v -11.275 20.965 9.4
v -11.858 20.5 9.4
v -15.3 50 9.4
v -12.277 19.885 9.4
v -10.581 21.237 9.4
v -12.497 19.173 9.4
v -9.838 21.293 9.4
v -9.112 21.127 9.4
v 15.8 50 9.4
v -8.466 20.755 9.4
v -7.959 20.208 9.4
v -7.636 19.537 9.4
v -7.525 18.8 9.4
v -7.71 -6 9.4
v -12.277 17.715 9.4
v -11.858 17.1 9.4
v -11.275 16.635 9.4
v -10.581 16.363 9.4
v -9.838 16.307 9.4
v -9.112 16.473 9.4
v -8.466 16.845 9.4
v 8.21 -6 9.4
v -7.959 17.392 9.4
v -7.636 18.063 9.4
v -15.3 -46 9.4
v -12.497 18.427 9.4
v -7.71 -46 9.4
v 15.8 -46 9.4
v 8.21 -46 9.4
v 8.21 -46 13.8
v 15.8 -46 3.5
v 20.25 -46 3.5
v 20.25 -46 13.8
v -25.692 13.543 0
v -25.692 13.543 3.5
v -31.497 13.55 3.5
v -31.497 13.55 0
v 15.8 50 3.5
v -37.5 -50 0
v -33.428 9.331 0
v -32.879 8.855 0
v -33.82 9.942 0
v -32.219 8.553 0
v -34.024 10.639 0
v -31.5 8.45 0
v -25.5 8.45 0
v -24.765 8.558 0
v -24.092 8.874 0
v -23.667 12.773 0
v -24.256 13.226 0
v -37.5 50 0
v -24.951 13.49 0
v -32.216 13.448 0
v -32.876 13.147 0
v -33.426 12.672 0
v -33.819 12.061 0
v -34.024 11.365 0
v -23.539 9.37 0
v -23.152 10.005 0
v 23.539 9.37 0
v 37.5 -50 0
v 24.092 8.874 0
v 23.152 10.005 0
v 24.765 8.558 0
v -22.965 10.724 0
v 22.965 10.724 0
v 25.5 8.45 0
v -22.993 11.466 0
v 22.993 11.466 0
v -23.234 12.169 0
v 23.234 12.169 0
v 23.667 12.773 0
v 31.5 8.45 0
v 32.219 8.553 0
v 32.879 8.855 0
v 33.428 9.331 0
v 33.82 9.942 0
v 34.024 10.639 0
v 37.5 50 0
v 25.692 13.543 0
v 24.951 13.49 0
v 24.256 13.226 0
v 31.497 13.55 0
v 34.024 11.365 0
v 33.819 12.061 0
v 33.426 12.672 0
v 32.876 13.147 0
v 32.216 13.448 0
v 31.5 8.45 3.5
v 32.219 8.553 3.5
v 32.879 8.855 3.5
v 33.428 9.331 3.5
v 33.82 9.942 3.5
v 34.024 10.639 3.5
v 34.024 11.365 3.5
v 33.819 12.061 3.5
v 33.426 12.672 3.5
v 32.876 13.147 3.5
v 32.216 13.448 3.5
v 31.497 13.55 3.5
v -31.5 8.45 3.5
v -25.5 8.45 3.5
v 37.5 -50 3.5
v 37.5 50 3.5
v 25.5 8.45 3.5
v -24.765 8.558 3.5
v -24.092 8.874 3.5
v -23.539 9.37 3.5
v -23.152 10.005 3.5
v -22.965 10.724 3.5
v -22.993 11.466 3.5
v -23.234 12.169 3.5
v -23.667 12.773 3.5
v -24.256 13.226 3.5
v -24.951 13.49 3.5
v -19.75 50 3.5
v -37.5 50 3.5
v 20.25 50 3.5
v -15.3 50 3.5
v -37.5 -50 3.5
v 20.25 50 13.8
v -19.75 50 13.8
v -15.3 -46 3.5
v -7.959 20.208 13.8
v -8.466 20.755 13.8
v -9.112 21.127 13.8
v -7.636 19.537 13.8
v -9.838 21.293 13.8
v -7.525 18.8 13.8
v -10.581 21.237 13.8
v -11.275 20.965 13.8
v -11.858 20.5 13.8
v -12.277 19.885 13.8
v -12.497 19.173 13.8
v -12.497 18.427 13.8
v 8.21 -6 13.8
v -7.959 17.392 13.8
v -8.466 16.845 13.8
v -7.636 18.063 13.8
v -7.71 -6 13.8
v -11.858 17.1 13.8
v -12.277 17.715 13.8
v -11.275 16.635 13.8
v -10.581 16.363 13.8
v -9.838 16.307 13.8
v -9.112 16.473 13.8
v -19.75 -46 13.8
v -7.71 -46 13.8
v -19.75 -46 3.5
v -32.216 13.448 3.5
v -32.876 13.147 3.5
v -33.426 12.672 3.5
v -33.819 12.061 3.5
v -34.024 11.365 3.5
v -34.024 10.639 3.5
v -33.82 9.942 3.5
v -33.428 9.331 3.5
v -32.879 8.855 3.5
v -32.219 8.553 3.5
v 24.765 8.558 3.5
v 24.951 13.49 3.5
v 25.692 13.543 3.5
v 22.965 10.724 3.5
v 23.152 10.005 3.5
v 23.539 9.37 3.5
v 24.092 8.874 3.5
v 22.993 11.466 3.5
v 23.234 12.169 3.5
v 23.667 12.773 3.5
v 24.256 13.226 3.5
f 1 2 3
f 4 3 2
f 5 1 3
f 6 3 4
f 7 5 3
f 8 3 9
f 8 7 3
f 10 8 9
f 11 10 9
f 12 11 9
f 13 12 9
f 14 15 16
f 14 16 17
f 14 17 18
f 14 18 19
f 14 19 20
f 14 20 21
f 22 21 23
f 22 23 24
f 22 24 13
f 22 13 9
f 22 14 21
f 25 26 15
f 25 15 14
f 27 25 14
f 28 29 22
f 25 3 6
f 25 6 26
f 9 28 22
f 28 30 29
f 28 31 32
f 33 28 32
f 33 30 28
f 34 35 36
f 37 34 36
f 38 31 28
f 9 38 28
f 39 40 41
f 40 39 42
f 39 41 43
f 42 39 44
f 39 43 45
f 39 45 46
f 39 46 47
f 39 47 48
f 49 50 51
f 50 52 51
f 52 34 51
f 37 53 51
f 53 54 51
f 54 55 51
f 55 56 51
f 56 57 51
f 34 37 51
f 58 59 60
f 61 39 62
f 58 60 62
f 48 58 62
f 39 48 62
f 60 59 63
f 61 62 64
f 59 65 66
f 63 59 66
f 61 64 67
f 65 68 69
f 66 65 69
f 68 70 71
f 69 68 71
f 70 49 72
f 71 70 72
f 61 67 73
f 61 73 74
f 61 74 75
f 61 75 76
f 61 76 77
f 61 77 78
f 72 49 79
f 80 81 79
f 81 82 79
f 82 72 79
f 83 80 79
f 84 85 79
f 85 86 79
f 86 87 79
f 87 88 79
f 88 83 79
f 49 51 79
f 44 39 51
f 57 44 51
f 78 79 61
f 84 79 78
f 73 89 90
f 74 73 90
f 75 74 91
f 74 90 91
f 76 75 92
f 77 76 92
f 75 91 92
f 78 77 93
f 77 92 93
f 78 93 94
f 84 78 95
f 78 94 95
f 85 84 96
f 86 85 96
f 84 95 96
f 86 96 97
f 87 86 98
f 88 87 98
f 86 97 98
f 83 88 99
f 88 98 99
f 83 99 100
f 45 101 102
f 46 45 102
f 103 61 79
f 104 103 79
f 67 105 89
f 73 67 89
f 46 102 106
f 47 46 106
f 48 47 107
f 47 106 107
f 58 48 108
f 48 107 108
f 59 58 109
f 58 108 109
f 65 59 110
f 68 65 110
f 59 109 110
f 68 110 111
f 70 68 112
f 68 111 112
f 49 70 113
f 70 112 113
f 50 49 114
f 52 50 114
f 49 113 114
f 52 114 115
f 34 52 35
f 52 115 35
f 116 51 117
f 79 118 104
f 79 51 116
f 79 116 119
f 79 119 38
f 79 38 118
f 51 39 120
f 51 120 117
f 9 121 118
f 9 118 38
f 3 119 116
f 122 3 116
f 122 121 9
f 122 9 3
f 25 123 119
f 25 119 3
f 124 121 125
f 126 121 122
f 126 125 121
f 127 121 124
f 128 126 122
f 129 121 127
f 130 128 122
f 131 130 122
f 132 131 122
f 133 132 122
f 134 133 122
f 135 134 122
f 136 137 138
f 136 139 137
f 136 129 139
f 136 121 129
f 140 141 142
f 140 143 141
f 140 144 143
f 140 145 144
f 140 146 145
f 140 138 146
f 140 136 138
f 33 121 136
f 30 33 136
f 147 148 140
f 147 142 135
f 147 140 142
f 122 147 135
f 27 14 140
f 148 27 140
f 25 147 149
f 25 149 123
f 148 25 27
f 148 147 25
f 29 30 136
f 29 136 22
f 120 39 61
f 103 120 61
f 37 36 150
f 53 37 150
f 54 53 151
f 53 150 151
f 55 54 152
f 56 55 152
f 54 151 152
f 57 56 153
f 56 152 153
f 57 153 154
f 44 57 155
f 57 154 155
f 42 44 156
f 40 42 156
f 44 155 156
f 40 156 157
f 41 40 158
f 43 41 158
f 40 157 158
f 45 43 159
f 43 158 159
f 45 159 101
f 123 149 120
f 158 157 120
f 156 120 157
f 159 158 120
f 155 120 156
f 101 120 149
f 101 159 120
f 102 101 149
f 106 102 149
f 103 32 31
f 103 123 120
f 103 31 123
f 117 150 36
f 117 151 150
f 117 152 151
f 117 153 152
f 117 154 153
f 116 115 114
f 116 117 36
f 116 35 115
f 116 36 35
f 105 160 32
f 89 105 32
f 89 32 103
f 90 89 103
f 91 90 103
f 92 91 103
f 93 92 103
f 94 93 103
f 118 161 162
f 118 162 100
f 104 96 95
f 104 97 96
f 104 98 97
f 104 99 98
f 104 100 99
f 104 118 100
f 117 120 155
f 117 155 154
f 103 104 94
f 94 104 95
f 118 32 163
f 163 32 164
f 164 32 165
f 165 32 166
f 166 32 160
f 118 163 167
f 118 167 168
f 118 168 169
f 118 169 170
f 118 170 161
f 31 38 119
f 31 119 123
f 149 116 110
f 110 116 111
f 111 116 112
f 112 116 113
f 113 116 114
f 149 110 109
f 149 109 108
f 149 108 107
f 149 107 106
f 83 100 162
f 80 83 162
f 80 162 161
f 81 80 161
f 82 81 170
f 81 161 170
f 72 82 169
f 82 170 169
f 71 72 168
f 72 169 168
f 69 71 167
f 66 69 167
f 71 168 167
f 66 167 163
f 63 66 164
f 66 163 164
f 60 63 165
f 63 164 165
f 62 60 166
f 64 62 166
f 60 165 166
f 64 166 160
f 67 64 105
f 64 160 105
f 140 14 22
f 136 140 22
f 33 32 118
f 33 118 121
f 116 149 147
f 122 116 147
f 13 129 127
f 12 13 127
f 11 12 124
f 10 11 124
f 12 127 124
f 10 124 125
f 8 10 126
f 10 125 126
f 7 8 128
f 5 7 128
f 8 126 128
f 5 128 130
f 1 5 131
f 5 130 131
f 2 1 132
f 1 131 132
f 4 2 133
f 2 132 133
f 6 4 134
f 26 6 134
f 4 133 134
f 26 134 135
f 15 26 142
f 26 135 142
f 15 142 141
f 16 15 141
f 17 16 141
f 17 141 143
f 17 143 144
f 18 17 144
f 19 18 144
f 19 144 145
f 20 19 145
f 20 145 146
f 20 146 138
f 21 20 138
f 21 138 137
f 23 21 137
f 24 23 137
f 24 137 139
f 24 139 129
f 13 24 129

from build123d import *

# Parameters (mm, degrees)
F0_W      = 75
F0_H      = 100
F1_DEPTH  = 3.5
F3_DEPTH  = 3.5
F4_W      = 40
F4_H      = 40.000004
F5_DEPTH  = 10.3
F7_DEPTH  = 40
F9_R      = 2.5
F10_DEPTH = 5.5
F11_W     = 40
F11_H     = 10.3
F12_DEPTH = 16
F8_W      = 31.1
F8_H      = 5.9
F13_DEPTH = 56.000004


with BuildPart() as f1:
    # F0 (on Top) → F1 (new body)
    with BuildSketch(Plane.XY):
        Rectangle(F0_W, F0_H)
    extrude(amount=F1_DEPTH)

    # F2 (on face) → F3 (cut, through all)
    with BuildSketch(Plane.XY.offset(3.5)):
        with BuildLine():
            Line((25.5, 8.45), (31.5, 8.45))
            ThreePointArc((31.5, 8.45), (34.05, 11.001591), (31.496817, 13.549998))
            Line((31.496817, 13.549998), (25.692115, 13.542753))
            ThreePointArc((25.692115, 13.542753), (22.951812, 11.096126), (25.5, 8.45))
        make_face()
        with BuildLine():
            ThreePointArc((-25.5, 8.45), (-22.951812, 11.096126), (-25.692115, 13.542753))
            Line((-25.692115, 13.542753), (-31.496817, 13.549998))
            ThreePointArc((-31.496817, 13.549998), (-34.05, 11.001591), (-31.5, 8.45))
            Line((-31.5, 8.45), (-25.5, 8.45))
        make_face()
    extrude(amount=-F3_DEPTH, mode=Mode.SUBTRACT)

    # F4 (on face) → F5 (join)
    with BuildSketch(Plane.XY.offset(3.5)):
        with Locations((0.25, 14.000002)):
            Rectangle(F4_W, F4_H)
    extrude(amount=F5_DEPTH)

    # F6 (on face) → F7 (join)
    with BuildSketch(Plane.XZ.offset(6)):
        Polygon((-7.71, 13.8), (-19.75, 13.8), (-19.75, 3.5), (-15.3, 3.5), (-15.3, 9.4), (-7.71, 9.4), align=None)
        Polygon((20.25, 3.5), (20.25, 13.8), (8.21, 13.8), (8.21, 9.4), (15.8, 9.4), (15.8, 3.5), align=None)
    extrude(amount=F7_DEPTH)

    # F9 (on face) → F10 (cut)
    with BuildSketch(Plane.XY.offset(13.8)):
        with Locations((-10.025, 18.8)):
            Circle(F9_R)
    extrude(amount=-F10_DEPTH, mode=Mode.SUBTRACT)

    # F11 (on face) → F12 (join)
    with BuildSketch(Plane(origin=(0, 34.000004, 0), x_dir=(-1, 0, 0), z_dir=(0, 1, 0))):
        with Locations((-0.25, 8.65)):
            Rectangle(F11_W, F11_H)
    extrude(amount=F12_DEPTH)

    # F8 (on face) → F13 (cut, through all)
    with BuildSketch(Plane.XZ.offset(6)):
        with Locations((0.25, 6.45)):
            Rectangle(F8_W, F8_H)
    extrude(amount=-F13_DEPTH, mode=Mode.SUBTRACT)


solid = f1.part
